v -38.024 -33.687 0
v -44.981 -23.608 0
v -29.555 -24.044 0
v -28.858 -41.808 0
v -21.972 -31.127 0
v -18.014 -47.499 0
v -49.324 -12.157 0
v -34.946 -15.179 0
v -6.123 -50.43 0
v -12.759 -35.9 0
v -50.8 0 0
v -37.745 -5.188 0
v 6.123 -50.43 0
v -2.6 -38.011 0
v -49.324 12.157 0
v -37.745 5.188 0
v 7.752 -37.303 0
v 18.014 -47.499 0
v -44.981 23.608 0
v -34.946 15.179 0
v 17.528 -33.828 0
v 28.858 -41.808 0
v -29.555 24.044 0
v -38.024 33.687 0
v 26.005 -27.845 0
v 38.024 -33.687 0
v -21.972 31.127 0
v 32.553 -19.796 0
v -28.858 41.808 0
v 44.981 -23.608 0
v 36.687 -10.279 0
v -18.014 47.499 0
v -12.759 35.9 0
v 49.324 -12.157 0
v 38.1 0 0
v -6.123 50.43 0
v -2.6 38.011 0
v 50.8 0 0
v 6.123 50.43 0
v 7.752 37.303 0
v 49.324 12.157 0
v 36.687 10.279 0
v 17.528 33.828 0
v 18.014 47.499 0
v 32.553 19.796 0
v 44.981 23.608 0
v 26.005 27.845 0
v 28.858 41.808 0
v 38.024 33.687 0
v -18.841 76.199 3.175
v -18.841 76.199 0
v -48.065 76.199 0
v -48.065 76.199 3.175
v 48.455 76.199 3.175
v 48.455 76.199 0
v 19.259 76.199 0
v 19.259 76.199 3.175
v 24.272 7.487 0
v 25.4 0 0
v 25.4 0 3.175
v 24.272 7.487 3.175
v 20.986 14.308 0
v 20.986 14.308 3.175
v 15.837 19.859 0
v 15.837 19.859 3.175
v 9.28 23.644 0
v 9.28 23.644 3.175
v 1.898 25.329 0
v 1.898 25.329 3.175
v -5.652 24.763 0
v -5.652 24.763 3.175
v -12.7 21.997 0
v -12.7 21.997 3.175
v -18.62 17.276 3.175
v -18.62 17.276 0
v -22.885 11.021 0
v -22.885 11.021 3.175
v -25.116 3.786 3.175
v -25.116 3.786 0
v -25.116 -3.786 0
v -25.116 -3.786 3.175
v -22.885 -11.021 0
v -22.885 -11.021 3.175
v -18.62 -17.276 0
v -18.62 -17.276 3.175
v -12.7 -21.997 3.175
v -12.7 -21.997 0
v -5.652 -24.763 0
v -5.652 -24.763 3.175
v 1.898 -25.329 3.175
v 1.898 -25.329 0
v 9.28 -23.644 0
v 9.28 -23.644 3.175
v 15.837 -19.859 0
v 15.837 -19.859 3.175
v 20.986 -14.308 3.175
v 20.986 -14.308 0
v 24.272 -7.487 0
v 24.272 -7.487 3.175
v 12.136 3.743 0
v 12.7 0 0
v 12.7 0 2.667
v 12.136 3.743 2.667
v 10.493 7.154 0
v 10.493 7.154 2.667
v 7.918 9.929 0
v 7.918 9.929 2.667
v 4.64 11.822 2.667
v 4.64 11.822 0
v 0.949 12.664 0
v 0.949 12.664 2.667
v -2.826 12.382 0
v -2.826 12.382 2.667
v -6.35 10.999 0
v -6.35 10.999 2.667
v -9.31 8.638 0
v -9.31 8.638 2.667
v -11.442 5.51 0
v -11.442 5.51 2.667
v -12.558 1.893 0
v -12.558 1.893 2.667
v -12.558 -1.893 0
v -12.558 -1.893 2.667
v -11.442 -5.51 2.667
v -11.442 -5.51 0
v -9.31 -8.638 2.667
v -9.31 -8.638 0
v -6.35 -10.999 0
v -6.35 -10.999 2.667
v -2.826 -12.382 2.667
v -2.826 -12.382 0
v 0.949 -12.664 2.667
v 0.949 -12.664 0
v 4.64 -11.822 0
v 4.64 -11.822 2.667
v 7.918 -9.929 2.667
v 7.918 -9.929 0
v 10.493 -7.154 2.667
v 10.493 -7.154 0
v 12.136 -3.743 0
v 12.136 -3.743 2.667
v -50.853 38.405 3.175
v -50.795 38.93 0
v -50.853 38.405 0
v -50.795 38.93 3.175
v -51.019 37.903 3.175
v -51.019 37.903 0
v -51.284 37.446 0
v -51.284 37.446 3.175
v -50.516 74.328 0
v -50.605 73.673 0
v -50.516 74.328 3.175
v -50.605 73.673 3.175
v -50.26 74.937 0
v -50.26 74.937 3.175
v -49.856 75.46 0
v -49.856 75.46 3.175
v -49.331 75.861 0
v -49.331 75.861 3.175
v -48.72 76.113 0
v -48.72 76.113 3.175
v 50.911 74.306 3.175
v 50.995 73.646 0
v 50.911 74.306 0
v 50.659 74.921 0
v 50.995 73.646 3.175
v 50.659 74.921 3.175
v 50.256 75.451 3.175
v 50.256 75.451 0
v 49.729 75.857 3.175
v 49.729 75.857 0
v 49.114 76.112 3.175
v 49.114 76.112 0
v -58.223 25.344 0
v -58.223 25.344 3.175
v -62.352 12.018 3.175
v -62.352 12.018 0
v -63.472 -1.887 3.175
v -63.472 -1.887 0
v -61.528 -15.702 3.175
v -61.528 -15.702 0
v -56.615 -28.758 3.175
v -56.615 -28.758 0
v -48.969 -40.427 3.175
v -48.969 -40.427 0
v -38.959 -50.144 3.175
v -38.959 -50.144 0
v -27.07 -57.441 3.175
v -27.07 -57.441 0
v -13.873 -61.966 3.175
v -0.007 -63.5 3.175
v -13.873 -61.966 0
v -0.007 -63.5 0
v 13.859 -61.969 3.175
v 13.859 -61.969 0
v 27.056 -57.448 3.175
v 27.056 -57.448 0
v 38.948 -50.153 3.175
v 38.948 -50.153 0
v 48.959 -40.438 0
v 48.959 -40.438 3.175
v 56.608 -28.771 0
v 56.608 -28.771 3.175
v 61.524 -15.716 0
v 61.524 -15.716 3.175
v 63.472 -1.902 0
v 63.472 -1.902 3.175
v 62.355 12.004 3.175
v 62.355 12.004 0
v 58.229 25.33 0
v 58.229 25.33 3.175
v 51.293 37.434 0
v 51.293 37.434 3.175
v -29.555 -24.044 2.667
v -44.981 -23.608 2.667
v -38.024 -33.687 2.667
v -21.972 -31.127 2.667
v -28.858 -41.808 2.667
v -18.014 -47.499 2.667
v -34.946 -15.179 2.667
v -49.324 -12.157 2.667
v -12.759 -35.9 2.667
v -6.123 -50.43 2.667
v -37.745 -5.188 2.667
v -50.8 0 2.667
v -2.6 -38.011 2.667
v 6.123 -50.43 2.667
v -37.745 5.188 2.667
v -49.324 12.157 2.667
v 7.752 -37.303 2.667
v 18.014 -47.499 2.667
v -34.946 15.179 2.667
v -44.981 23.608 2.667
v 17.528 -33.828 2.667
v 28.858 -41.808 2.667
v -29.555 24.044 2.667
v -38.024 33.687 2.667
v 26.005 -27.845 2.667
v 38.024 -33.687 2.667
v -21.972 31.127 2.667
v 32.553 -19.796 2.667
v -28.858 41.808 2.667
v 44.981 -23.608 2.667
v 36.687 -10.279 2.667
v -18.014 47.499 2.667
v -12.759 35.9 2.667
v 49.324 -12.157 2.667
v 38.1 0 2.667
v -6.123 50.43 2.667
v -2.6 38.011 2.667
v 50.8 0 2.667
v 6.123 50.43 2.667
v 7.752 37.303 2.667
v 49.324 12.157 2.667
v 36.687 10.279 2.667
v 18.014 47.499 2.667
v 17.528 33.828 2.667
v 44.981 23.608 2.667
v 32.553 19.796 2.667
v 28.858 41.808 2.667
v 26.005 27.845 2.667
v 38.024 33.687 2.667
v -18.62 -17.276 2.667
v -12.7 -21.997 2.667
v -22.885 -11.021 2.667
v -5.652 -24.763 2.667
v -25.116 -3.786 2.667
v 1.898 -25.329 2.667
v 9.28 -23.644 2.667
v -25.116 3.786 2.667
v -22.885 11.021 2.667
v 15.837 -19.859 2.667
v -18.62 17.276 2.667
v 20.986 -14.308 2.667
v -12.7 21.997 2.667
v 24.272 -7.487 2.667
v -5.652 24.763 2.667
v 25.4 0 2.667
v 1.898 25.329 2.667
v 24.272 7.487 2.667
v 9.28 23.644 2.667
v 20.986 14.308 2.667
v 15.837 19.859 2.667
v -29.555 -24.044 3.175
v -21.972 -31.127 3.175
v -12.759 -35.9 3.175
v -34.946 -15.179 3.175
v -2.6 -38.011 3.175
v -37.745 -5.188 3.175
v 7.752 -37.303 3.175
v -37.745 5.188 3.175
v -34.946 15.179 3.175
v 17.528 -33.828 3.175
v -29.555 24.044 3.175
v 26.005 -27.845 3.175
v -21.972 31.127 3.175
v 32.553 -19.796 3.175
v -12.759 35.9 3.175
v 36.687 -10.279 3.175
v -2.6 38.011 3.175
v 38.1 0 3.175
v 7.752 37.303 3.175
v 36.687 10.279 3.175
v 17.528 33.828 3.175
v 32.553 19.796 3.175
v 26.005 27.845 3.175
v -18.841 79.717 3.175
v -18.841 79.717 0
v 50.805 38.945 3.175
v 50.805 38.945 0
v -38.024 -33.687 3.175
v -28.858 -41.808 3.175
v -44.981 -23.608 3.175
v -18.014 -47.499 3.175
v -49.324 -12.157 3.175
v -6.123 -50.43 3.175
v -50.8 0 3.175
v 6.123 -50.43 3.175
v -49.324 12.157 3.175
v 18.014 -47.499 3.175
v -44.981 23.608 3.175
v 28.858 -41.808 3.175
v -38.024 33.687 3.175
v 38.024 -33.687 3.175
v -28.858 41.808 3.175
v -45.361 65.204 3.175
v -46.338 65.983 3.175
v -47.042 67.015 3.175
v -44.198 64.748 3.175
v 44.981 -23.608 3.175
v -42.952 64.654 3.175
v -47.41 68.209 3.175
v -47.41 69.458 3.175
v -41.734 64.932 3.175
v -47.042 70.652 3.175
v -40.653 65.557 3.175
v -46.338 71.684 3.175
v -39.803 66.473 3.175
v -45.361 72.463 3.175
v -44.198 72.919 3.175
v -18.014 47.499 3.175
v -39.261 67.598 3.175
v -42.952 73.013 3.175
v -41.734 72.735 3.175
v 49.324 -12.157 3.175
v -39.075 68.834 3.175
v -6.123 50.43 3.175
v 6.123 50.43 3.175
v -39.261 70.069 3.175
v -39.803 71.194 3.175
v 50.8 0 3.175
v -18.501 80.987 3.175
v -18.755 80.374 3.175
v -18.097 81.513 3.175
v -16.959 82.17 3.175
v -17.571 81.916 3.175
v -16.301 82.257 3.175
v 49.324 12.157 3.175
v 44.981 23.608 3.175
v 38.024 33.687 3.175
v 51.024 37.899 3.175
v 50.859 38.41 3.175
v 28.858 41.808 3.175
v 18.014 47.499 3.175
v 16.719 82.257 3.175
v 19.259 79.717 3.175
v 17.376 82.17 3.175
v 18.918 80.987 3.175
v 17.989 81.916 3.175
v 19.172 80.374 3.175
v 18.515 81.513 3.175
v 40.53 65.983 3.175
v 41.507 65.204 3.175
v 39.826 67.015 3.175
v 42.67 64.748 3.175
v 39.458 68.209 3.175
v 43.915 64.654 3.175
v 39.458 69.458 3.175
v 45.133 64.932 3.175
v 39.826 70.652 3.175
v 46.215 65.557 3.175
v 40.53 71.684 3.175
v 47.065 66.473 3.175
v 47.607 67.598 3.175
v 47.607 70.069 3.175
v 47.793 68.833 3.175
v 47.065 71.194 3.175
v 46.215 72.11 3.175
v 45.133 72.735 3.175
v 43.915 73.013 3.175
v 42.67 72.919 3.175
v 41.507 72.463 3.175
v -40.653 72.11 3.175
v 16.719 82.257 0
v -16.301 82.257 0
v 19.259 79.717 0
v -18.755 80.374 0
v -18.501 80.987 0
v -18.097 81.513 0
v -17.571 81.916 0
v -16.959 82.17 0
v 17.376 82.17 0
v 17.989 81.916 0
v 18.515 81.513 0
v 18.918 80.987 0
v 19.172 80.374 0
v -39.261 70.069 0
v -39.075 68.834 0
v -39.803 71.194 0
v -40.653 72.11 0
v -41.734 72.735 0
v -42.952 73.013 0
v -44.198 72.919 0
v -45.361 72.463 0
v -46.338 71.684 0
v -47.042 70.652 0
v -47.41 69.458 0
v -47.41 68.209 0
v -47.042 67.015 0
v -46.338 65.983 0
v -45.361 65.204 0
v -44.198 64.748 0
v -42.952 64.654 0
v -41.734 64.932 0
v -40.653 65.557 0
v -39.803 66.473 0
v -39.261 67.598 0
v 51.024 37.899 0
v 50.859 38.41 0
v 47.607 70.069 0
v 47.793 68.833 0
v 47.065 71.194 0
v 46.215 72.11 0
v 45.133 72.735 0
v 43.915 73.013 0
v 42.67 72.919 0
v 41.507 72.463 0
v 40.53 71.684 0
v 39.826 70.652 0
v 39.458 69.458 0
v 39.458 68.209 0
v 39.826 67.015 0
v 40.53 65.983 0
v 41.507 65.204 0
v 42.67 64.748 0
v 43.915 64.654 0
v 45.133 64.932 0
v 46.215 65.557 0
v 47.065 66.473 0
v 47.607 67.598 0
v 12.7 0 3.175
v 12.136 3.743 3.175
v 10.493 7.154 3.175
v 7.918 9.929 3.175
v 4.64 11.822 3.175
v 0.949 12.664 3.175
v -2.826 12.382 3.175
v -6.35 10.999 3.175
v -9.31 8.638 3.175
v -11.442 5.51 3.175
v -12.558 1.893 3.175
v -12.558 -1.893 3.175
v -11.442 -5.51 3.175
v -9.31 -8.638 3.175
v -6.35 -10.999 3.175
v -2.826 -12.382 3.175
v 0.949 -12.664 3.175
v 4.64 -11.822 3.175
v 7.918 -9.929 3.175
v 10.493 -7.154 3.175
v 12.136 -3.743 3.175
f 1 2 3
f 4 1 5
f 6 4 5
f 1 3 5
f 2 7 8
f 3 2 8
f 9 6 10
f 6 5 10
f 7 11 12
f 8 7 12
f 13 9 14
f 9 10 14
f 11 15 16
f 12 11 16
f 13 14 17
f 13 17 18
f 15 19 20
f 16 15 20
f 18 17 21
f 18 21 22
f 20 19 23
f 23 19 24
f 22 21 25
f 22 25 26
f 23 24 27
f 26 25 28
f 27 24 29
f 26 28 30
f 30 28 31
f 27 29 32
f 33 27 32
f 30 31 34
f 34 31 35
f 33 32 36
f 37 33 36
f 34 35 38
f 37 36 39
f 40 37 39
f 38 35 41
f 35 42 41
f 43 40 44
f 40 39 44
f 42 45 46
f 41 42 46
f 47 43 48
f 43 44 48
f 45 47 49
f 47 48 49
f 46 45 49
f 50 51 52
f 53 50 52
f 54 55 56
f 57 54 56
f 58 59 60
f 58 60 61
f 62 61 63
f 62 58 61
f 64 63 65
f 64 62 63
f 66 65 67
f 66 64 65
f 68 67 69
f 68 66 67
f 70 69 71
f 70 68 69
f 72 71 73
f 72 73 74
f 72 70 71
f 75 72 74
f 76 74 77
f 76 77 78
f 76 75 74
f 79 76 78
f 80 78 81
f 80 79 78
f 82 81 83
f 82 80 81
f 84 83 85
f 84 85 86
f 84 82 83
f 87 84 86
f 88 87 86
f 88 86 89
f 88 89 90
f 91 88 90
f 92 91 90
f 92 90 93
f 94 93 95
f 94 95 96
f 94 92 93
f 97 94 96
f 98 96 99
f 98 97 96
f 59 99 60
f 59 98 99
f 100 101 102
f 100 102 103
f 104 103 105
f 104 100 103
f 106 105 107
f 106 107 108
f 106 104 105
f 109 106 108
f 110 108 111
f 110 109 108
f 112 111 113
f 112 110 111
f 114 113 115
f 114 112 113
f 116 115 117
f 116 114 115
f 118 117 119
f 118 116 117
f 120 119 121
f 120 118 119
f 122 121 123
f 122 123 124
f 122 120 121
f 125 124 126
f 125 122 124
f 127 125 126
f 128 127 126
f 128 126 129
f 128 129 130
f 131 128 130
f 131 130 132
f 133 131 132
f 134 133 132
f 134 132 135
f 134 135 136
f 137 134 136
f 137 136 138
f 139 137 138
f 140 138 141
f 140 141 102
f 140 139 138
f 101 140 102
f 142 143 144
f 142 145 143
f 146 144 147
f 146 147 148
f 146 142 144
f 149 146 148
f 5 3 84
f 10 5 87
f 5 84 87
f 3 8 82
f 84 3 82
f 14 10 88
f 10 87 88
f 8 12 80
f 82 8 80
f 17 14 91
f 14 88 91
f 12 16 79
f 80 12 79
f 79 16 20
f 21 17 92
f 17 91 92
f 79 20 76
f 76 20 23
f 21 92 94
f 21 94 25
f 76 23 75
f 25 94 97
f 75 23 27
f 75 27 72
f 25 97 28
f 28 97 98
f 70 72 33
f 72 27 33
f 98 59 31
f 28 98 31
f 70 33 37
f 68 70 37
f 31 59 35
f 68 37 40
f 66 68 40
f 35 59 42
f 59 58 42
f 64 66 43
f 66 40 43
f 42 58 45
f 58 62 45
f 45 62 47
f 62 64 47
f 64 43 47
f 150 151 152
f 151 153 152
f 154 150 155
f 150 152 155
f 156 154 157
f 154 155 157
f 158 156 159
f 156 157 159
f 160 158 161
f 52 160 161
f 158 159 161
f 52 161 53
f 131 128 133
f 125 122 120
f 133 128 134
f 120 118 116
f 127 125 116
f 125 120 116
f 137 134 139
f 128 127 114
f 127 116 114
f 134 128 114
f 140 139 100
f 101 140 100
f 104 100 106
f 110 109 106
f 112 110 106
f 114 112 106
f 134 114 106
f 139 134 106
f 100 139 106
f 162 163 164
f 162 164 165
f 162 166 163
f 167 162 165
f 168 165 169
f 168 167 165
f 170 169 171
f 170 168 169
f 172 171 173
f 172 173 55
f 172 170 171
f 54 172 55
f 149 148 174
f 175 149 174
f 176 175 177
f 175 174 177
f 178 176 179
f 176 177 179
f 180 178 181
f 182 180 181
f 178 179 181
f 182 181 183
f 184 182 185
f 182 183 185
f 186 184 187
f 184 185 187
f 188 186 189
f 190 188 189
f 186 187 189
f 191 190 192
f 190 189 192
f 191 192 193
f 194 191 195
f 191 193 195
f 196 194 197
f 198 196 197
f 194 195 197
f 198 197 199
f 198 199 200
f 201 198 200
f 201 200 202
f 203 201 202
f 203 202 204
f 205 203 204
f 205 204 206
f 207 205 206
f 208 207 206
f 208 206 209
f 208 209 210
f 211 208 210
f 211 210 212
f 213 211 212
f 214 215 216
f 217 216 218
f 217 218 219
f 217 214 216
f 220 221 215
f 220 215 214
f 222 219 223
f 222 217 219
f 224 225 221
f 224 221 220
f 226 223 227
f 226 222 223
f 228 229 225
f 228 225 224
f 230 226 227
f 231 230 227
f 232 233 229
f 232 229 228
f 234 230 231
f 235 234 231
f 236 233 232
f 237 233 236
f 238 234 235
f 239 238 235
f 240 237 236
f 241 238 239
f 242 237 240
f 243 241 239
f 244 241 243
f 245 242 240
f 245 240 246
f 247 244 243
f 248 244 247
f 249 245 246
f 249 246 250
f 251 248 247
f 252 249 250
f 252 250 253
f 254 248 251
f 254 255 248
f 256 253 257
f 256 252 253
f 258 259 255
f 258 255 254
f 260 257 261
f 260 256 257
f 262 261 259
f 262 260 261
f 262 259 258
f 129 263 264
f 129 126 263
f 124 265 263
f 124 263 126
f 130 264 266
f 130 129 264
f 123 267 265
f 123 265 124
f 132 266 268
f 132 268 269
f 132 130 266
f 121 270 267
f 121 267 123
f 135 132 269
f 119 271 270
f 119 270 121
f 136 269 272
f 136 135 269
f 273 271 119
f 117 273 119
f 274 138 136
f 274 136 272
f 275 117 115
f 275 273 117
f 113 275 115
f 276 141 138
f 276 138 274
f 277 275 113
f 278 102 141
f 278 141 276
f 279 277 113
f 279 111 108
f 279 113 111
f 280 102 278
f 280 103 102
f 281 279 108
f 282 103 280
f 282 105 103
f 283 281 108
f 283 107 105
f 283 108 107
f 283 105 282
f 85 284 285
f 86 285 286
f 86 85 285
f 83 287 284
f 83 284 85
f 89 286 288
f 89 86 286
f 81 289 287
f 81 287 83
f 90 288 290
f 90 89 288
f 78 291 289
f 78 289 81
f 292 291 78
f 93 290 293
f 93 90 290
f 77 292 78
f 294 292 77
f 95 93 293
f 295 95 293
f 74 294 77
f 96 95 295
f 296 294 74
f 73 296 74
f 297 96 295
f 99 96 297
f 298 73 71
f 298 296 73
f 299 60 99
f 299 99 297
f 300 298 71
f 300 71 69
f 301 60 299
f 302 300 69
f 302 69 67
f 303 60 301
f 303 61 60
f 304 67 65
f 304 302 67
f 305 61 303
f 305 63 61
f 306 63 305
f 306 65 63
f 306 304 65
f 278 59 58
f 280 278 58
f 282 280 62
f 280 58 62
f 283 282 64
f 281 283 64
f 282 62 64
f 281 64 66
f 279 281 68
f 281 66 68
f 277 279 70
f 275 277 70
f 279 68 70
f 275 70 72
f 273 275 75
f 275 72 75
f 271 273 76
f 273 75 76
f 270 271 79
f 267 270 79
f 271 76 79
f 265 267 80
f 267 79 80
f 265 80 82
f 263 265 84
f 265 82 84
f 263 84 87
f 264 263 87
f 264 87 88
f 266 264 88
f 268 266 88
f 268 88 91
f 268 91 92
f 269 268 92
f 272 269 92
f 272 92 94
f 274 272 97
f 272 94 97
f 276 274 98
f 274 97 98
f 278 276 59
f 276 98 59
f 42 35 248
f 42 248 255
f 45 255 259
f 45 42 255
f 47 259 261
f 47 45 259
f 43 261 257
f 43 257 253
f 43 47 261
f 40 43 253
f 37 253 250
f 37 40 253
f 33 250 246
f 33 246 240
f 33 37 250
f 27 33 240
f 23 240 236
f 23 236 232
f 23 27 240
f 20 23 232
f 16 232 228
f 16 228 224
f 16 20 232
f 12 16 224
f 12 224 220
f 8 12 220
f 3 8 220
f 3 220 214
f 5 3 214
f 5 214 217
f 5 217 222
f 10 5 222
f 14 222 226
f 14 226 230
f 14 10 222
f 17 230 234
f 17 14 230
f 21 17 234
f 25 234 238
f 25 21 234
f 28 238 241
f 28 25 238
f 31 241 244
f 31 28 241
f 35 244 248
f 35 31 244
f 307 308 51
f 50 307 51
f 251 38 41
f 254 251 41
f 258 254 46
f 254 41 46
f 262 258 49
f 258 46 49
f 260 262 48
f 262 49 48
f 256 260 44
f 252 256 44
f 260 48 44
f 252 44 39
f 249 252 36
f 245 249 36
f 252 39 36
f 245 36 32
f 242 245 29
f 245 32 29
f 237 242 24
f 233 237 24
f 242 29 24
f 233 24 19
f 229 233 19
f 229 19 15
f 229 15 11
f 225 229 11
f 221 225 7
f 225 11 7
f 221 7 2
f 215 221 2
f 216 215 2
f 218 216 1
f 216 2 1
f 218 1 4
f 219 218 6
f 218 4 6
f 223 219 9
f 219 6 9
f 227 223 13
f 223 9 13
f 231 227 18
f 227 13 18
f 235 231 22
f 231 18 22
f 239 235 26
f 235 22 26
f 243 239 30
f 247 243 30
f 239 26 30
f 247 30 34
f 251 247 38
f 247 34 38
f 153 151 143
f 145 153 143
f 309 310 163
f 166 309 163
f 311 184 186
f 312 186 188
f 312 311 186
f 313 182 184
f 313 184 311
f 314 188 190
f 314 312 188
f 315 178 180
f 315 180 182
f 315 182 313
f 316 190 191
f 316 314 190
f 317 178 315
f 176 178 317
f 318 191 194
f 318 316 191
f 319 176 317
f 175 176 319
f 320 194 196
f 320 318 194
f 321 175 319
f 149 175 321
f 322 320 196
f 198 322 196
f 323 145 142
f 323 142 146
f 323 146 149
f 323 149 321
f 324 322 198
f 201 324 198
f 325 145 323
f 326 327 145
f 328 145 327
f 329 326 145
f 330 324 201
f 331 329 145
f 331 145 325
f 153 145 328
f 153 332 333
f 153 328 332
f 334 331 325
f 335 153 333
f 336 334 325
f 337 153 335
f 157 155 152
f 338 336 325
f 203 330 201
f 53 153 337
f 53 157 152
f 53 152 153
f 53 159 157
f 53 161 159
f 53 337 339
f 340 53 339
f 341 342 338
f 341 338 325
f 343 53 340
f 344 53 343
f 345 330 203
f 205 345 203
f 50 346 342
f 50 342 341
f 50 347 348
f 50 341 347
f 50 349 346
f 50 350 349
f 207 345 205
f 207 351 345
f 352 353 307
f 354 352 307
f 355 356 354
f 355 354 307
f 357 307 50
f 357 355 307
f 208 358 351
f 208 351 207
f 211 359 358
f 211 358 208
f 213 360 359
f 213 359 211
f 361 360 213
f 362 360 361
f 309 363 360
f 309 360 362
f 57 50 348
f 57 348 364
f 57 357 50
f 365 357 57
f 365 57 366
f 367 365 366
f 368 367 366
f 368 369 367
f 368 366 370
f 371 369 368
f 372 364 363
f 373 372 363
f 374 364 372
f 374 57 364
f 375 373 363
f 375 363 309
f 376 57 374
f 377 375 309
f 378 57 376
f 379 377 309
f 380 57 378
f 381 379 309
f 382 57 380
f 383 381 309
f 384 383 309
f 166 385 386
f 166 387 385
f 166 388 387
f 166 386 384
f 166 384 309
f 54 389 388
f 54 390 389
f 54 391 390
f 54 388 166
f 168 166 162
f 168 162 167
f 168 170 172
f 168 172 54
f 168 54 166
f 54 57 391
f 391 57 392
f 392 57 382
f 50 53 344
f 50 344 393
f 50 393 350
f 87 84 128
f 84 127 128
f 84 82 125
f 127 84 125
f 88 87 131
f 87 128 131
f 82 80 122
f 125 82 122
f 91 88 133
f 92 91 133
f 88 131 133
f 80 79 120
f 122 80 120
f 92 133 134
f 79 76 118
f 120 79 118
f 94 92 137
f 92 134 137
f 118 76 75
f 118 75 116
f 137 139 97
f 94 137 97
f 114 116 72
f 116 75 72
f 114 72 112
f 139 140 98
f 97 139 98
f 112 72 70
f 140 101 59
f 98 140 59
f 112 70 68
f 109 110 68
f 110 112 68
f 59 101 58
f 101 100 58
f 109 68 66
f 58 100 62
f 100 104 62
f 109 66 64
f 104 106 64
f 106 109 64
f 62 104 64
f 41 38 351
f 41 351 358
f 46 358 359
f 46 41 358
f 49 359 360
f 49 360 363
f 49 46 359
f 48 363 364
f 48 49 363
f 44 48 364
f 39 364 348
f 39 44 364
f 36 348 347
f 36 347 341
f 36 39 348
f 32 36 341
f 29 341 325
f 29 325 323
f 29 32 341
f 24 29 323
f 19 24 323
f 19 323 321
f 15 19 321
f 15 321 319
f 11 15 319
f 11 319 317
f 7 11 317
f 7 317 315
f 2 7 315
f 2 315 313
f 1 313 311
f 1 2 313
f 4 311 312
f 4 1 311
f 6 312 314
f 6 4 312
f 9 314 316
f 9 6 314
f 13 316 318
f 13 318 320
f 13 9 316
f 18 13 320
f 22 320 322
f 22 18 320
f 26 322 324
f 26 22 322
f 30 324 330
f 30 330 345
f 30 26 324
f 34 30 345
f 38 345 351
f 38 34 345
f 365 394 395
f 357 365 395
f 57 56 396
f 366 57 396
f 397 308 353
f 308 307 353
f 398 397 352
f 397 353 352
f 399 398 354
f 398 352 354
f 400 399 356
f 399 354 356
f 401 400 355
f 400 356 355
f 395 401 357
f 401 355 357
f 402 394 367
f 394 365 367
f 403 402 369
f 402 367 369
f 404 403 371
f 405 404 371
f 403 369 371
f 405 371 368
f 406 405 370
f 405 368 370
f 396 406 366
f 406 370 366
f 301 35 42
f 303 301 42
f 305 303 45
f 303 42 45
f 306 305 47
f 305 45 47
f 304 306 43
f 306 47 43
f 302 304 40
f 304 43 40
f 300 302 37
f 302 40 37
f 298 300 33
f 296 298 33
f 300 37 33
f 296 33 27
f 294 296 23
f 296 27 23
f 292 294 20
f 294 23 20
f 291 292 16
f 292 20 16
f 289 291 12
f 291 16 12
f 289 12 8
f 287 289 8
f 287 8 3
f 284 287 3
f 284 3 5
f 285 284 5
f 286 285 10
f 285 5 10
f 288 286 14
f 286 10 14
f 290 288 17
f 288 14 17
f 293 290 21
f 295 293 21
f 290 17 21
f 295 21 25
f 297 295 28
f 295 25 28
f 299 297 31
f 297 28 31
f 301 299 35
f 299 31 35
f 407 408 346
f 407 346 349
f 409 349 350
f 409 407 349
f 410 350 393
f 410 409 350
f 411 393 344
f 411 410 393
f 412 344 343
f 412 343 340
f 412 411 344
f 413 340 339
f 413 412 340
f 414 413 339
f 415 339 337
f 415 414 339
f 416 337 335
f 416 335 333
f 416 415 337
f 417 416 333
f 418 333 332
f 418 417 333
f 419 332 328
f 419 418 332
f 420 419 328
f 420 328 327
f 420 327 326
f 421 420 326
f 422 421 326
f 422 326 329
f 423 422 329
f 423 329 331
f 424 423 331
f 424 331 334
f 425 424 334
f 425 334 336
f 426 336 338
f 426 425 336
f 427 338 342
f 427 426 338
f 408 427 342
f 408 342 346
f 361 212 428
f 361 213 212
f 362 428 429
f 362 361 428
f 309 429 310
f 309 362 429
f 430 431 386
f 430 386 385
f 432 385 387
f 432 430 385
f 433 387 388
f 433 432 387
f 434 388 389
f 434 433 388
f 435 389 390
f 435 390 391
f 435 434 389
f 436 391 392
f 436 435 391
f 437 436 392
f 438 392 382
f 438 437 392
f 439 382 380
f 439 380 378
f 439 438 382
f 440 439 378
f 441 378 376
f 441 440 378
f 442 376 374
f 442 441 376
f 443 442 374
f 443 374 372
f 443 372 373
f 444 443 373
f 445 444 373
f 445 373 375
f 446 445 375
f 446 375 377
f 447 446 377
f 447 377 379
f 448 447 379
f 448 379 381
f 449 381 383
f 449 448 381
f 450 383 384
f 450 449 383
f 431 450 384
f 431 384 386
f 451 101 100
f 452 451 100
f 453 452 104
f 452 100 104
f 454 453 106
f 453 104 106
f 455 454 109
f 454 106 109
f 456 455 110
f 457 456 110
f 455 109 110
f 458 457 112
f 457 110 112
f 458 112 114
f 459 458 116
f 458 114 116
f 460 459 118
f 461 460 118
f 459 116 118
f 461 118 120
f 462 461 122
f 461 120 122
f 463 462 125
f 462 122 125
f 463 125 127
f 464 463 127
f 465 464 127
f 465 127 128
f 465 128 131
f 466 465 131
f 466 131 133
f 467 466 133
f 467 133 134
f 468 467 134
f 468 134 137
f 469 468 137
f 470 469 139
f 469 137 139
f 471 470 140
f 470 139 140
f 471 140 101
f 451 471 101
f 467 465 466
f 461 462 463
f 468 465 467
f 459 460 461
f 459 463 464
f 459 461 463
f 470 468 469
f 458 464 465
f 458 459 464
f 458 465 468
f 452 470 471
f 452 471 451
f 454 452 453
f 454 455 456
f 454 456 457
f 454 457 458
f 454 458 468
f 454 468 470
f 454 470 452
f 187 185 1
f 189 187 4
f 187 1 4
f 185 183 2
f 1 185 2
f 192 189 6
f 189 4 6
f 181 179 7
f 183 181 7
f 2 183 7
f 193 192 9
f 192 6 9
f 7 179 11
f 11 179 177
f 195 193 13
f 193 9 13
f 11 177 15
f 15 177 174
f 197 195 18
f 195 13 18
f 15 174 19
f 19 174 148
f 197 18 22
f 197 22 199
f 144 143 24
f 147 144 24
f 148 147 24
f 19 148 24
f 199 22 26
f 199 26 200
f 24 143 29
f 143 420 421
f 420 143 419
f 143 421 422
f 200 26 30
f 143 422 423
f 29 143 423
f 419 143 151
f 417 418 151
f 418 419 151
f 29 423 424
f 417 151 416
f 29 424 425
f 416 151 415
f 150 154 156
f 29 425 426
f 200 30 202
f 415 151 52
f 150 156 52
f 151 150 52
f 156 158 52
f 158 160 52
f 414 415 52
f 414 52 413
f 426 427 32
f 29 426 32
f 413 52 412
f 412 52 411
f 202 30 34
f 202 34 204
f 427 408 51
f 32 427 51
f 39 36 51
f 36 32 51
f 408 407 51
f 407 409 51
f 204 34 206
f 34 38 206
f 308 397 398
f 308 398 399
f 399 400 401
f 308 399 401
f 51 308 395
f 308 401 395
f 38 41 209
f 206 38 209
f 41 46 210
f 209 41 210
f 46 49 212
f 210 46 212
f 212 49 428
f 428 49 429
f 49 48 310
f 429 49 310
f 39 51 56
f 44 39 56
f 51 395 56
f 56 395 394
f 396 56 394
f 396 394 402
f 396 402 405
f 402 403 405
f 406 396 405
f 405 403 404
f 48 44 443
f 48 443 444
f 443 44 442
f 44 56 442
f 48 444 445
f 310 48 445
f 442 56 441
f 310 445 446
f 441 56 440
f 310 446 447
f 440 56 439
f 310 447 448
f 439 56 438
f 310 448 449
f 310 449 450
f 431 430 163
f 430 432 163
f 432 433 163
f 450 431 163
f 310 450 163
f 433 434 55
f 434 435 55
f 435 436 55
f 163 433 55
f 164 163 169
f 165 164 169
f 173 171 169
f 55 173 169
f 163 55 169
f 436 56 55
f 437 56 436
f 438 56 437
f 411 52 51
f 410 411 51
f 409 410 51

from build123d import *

# Parameters (mm, degrees)
F0_R     = 38.1
F0_R_2   = 25.4
F1_DEPTH = 3.175
F0_R_3   = 12.7
F0_R_4   = 50.8
F0_R_5   = 4.191
F2_DEPTH = 2.667
F3_R     = 2.54


# Not quite as in the source:
# - a feature names something its author has since deleted; it is built from what else it names


with BuildPart() as f1:
    # F0 (on Top) → F1 (new body)
    with BuildSketch(Plane.XY):
        Circle(F0_R)
        Circle(F0_R_2, mode=Mode.SUBTRACT)
    extrude(amount=F1_DEPTH)


with BuildPart() as f1b:
    # F0 (on Top) → F1, piece 2 (new body)
    with BuildSketch(Plane.XY):
        Circle(F0_R_3)
    extrude(amount=F1_DEPTH)


with BuildPart() as f1c:
    # F0 (on Top) → F1, piece 3 (new body)
    with BuildSketch(Plane.XY):
        with BuildLine():
            Line((-50.5914217212, 76.1994290653), (-50.8, 38.1))
            ThreePointArc((-50.8, 38.1), (0, -63.5), (50.8, 38.1))
            Line((50.8, 38.1), (51.0085782789, 76.1994290653))
            Line((51.0085782789, 76.1994290653), (19.2585782788, 76.1994290653))
            Line((19.2585782788, 76.1994290653), (19.2585782788, 82.256702956))
            Line((19.2585782788, 82.256702956), (-18.8414217212, 82.256702956))
            Line((-18.8414217212, 82.256702956), (-18.8414217212, 76.1994290653))
            Line((-18.8414217212, 76.1994290653), (-50.5914217211, 76.1994290653))
        make_face()
        Circle(F0_R_4, mode=Mode.SUBTRACT)
        with Locations((-43.265636348, 68.8335622319)):
            Circle(F0_R_5, mode=Mode.SUBTRACT)
        with Locations((43.6021421583, 68.8334290653)):
            Circle(F0_R_5, mode=Mode.SUBTRACT)
    extrude(amount=F1_DEPTH)

    # F3
    f3_edges = [f1c.edges().sort_by_distance(p)[0] for p in [
        (-18.841422, 82.256703, 1.5875),
        (19.258578, 82.256703, 1.5875),
        (-50.591422, 76.199429, 1.5875),
        (51.008578, 76.199429, 1.5875),
        (-50.8, 38.1, 1.5875),
        (50.8, 38.1, 1.5875),
    ]]
    fillet(f3_edges, radius=F3_R)


with BuildPart() as f2:
    # F0 (on Top) → F2 (new body)
    with BuildSketch(Plane.XY):
        Circle(F0_R_4)
        Circle(F0_R, mode=Mode.SUBTRACT)
    extrude(amount=F2_DEPTH)


with BuildPart() as f2b:
    # F0 (on Top) → F2, piece 2 (new body)
    with BuildSketch(Plane.XY):
        Circle(F0_R_2)
        Circle(F0_R_3, mode=Mode.SUBTRACT)
    extrude(amount=F2_DEPTH)


solid = Compound([f1.part, f1b.part, f1c.part, f2.part, f2b.part])
